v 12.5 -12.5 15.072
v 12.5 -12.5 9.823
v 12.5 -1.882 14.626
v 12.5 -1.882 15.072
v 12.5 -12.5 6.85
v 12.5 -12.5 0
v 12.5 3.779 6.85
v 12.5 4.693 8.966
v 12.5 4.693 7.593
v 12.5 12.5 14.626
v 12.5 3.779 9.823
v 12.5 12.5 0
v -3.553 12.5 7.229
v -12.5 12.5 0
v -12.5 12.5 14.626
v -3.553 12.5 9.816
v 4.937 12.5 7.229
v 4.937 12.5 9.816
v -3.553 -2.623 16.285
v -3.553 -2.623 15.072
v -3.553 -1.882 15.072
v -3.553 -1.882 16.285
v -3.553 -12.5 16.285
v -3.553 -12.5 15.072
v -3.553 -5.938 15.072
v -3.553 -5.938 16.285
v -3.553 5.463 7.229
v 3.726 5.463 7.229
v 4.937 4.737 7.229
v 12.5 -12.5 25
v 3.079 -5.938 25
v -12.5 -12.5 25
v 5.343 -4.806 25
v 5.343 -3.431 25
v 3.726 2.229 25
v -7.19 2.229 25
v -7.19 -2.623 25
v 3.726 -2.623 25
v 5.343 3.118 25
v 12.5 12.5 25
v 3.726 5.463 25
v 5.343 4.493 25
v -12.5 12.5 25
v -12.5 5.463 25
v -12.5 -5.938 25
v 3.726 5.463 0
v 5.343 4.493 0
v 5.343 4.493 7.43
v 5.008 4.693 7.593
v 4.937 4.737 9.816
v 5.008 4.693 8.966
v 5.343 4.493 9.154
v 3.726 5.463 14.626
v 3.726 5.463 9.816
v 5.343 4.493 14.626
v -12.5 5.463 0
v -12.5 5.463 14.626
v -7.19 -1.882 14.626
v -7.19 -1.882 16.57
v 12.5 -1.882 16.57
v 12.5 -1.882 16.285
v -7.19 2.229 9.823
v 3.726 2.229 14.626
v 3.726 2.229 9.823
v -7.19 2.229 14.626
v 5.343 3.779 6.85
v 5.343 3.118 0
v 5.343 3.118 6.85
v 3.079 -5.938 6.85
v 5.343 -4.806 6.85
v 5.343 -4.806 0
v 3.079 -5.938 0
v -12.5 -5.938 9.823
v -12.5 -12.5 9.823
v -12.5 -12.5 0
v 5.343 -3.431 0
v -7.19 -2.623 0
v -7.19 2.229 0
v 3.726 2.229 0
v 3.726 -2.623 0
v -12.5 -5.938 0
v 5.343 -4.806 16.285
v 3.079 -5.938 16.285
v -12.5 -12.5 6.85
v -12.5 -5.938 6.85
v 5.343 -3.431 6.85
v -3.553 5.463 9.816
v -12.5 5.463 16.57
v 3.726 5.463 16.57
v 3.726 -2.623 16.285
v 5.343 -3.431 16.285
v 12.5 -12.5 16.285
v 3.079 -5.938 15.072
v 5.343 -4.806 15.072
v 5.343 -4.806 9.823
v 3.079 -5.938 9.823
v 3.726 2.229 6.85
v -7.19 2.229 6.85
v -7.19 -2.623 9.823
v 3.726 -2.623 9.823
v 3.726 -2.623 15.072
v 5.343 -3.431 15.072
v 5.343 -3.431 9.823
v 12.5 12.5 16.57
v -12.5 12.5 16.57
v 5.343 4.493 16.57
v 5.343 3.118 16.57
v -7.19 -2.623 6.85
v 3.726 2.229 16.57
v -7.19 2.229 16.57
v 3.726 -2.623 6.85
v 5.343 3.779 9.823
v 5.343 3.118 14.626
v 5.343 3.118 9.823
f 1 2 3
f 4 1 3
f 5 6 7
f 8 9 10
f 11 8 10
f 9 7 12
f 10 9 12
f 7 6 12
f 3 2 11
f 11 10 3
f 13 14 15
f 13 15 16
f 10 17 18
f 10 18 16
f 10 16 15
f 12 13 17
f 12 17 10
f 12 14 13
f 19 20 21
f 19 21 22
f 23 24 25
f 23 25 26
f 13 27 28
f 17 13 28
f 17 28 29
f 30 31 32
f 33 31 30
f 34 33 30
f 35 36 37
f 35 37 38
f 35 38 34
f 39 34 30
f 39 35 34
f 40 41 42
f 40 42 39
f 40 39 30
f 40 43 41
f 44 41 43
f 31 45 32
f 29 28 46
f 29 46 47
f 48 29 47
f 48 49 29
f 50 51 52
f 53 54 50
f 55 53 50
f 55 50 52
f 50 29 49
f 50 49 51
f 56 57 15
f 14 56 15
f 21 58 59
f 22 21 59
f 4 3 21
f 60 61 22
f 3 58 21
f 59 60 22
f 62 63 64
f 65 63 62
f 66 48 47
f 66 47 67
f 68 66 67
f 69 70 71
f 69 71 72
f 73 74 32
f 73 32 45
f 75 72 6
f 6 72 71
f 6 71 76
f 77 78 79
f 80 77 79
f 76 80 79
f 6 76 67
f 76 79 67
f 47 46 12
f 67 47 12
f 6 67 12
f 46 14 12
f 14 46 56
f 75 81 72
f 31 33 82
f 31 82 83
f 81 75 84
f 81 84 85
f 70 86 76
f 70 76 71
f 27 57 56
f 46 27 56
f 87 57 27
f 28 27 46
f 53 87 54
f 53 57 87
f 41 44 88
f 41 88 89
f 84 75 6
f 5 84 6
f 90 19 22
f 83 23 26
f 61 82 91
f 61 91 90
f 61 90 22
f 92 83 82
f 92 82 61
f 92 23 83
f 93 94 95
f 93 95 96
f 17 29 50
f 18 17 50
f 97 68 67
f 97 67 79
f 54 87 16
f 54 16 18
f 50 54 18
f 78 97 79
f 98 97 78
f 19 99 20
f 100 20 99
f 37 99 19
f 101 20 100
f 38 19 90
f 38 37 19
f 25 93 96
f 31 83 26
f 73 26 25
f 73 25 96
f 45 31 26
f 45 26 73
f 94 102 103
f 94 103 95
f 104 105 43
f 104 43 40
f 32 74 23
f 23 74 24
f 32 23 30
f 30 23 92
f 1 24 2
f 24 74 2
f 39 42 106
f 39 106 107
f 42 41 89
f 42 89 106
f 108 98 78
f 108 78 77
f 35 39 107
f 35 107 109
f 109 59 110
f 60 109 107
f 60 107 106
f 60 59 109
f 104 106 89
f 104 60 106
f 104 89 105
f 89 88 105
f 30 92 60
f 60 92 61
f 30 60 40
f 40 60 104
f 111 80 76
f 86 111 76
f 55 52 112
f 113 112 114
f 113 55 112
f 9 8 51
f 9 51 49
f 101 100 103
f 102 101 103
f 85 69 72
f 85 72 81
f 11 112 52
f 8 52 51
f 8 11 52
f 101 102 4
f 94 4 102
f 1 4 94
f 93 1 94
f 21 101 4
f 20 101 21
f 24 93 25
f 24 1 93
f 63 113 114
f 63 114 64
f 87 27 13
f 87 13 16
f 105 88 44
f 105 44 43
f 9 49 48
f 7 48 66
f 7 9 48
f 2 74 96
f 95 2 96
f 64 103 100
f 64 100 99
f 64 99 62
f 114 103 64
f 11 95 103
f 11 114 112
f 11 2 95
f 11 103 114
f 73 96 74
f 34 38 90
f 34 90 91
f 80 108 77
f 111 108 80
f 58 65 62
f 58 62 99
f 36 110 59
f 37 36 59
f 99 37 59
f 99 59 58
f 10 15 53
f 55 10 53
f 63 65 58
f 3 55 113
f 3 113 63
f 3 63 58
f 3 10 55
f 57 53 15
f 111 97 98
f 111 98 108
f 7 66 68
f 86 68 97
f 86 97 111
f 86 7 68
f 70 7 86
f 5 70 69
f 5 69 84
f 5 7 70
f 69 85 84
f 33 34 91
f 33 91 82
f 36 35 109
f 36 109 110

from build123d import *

# Parameters (mm, degrees)
F0_W     = 25
F0_H     = 25
F1_DEPTH = 25
F5_DEPTH = 32.1
F6_DEPTH = 40.6
F2_W     = 8.489821
F2_H     = 2.587373
F7_DEPTH = 45.1


with BuildPart() as f1:
    # F0 (on Top) → F1 (new body)
    with BuildSketch(Plane.XY):
        Rectangle(F0_W, F0_H)
    extrude(amount=F1_DEPTH)

    # F4 (on face) → F5 (intersect)
    with BuildSketch(Plane.XY.offset(25)):
        Polygon((12.5, 12.5), (-12.5, 12.5), (-12.5, 5.462941), (3.725921, 5.462941), (5.34303, 4.492676), (5.34303, 3.118134), (3.725921, 2.228724), (-7.189562, 2.228724), (-7.189562, -2.622602), (3.725921, -2.622602), (5.34303, -3.431156), (5.34303, -4.805698), (3.079078, -5.937674), (-12.5, -5.937674), (-12.5, -12.5), (12.5, -12.5), align=None)
    extrude(amount=-F5_DEPTH, mode=Mode.INTERSECT)

    # F3 (on face) → F6 (intersect)
    with BuildSketch(Plane.YZ.offset(12.5)):
        Polygon((12.5, 16.569659), (12.5, 25), (-12.5, 25), (-12.5, 9.823196), (3.778635, 9.823196), (4.693409, 8.965595), (4.693409, 7.593432), (3.778635, 6.850178), (-12.5, 6.850178), (-12.5, 0), (12.5, 0), (12.5, 14.625764), (-1.881534, 14.625764), (-1.881534, 16.569659), align=None)
    extrude(amount=-F6_DEPTH, mode=Mode.INTERSECT)

    # F2 (on face) → F7 (intersect)
    with BuildSketch(Plane.XZ.offset(12.5)):
        Polygon((12.5, 16.284853), (12.5, 25), (-12.5, 25), (-12.5, 0), (12.5, 0), (12.5, 15.072023), (-3.553276, 15.072023), (-3.553276, 16.284853), align=None)
        with Locations((0.691634, 8.522733)):
            Rectangle(F2_W, F2_H, mode=Mode.SUBTRACT)
    extrude(amount=-F7_DEPTH, mode=Mode.INTERSECT)


solid = f1.part
